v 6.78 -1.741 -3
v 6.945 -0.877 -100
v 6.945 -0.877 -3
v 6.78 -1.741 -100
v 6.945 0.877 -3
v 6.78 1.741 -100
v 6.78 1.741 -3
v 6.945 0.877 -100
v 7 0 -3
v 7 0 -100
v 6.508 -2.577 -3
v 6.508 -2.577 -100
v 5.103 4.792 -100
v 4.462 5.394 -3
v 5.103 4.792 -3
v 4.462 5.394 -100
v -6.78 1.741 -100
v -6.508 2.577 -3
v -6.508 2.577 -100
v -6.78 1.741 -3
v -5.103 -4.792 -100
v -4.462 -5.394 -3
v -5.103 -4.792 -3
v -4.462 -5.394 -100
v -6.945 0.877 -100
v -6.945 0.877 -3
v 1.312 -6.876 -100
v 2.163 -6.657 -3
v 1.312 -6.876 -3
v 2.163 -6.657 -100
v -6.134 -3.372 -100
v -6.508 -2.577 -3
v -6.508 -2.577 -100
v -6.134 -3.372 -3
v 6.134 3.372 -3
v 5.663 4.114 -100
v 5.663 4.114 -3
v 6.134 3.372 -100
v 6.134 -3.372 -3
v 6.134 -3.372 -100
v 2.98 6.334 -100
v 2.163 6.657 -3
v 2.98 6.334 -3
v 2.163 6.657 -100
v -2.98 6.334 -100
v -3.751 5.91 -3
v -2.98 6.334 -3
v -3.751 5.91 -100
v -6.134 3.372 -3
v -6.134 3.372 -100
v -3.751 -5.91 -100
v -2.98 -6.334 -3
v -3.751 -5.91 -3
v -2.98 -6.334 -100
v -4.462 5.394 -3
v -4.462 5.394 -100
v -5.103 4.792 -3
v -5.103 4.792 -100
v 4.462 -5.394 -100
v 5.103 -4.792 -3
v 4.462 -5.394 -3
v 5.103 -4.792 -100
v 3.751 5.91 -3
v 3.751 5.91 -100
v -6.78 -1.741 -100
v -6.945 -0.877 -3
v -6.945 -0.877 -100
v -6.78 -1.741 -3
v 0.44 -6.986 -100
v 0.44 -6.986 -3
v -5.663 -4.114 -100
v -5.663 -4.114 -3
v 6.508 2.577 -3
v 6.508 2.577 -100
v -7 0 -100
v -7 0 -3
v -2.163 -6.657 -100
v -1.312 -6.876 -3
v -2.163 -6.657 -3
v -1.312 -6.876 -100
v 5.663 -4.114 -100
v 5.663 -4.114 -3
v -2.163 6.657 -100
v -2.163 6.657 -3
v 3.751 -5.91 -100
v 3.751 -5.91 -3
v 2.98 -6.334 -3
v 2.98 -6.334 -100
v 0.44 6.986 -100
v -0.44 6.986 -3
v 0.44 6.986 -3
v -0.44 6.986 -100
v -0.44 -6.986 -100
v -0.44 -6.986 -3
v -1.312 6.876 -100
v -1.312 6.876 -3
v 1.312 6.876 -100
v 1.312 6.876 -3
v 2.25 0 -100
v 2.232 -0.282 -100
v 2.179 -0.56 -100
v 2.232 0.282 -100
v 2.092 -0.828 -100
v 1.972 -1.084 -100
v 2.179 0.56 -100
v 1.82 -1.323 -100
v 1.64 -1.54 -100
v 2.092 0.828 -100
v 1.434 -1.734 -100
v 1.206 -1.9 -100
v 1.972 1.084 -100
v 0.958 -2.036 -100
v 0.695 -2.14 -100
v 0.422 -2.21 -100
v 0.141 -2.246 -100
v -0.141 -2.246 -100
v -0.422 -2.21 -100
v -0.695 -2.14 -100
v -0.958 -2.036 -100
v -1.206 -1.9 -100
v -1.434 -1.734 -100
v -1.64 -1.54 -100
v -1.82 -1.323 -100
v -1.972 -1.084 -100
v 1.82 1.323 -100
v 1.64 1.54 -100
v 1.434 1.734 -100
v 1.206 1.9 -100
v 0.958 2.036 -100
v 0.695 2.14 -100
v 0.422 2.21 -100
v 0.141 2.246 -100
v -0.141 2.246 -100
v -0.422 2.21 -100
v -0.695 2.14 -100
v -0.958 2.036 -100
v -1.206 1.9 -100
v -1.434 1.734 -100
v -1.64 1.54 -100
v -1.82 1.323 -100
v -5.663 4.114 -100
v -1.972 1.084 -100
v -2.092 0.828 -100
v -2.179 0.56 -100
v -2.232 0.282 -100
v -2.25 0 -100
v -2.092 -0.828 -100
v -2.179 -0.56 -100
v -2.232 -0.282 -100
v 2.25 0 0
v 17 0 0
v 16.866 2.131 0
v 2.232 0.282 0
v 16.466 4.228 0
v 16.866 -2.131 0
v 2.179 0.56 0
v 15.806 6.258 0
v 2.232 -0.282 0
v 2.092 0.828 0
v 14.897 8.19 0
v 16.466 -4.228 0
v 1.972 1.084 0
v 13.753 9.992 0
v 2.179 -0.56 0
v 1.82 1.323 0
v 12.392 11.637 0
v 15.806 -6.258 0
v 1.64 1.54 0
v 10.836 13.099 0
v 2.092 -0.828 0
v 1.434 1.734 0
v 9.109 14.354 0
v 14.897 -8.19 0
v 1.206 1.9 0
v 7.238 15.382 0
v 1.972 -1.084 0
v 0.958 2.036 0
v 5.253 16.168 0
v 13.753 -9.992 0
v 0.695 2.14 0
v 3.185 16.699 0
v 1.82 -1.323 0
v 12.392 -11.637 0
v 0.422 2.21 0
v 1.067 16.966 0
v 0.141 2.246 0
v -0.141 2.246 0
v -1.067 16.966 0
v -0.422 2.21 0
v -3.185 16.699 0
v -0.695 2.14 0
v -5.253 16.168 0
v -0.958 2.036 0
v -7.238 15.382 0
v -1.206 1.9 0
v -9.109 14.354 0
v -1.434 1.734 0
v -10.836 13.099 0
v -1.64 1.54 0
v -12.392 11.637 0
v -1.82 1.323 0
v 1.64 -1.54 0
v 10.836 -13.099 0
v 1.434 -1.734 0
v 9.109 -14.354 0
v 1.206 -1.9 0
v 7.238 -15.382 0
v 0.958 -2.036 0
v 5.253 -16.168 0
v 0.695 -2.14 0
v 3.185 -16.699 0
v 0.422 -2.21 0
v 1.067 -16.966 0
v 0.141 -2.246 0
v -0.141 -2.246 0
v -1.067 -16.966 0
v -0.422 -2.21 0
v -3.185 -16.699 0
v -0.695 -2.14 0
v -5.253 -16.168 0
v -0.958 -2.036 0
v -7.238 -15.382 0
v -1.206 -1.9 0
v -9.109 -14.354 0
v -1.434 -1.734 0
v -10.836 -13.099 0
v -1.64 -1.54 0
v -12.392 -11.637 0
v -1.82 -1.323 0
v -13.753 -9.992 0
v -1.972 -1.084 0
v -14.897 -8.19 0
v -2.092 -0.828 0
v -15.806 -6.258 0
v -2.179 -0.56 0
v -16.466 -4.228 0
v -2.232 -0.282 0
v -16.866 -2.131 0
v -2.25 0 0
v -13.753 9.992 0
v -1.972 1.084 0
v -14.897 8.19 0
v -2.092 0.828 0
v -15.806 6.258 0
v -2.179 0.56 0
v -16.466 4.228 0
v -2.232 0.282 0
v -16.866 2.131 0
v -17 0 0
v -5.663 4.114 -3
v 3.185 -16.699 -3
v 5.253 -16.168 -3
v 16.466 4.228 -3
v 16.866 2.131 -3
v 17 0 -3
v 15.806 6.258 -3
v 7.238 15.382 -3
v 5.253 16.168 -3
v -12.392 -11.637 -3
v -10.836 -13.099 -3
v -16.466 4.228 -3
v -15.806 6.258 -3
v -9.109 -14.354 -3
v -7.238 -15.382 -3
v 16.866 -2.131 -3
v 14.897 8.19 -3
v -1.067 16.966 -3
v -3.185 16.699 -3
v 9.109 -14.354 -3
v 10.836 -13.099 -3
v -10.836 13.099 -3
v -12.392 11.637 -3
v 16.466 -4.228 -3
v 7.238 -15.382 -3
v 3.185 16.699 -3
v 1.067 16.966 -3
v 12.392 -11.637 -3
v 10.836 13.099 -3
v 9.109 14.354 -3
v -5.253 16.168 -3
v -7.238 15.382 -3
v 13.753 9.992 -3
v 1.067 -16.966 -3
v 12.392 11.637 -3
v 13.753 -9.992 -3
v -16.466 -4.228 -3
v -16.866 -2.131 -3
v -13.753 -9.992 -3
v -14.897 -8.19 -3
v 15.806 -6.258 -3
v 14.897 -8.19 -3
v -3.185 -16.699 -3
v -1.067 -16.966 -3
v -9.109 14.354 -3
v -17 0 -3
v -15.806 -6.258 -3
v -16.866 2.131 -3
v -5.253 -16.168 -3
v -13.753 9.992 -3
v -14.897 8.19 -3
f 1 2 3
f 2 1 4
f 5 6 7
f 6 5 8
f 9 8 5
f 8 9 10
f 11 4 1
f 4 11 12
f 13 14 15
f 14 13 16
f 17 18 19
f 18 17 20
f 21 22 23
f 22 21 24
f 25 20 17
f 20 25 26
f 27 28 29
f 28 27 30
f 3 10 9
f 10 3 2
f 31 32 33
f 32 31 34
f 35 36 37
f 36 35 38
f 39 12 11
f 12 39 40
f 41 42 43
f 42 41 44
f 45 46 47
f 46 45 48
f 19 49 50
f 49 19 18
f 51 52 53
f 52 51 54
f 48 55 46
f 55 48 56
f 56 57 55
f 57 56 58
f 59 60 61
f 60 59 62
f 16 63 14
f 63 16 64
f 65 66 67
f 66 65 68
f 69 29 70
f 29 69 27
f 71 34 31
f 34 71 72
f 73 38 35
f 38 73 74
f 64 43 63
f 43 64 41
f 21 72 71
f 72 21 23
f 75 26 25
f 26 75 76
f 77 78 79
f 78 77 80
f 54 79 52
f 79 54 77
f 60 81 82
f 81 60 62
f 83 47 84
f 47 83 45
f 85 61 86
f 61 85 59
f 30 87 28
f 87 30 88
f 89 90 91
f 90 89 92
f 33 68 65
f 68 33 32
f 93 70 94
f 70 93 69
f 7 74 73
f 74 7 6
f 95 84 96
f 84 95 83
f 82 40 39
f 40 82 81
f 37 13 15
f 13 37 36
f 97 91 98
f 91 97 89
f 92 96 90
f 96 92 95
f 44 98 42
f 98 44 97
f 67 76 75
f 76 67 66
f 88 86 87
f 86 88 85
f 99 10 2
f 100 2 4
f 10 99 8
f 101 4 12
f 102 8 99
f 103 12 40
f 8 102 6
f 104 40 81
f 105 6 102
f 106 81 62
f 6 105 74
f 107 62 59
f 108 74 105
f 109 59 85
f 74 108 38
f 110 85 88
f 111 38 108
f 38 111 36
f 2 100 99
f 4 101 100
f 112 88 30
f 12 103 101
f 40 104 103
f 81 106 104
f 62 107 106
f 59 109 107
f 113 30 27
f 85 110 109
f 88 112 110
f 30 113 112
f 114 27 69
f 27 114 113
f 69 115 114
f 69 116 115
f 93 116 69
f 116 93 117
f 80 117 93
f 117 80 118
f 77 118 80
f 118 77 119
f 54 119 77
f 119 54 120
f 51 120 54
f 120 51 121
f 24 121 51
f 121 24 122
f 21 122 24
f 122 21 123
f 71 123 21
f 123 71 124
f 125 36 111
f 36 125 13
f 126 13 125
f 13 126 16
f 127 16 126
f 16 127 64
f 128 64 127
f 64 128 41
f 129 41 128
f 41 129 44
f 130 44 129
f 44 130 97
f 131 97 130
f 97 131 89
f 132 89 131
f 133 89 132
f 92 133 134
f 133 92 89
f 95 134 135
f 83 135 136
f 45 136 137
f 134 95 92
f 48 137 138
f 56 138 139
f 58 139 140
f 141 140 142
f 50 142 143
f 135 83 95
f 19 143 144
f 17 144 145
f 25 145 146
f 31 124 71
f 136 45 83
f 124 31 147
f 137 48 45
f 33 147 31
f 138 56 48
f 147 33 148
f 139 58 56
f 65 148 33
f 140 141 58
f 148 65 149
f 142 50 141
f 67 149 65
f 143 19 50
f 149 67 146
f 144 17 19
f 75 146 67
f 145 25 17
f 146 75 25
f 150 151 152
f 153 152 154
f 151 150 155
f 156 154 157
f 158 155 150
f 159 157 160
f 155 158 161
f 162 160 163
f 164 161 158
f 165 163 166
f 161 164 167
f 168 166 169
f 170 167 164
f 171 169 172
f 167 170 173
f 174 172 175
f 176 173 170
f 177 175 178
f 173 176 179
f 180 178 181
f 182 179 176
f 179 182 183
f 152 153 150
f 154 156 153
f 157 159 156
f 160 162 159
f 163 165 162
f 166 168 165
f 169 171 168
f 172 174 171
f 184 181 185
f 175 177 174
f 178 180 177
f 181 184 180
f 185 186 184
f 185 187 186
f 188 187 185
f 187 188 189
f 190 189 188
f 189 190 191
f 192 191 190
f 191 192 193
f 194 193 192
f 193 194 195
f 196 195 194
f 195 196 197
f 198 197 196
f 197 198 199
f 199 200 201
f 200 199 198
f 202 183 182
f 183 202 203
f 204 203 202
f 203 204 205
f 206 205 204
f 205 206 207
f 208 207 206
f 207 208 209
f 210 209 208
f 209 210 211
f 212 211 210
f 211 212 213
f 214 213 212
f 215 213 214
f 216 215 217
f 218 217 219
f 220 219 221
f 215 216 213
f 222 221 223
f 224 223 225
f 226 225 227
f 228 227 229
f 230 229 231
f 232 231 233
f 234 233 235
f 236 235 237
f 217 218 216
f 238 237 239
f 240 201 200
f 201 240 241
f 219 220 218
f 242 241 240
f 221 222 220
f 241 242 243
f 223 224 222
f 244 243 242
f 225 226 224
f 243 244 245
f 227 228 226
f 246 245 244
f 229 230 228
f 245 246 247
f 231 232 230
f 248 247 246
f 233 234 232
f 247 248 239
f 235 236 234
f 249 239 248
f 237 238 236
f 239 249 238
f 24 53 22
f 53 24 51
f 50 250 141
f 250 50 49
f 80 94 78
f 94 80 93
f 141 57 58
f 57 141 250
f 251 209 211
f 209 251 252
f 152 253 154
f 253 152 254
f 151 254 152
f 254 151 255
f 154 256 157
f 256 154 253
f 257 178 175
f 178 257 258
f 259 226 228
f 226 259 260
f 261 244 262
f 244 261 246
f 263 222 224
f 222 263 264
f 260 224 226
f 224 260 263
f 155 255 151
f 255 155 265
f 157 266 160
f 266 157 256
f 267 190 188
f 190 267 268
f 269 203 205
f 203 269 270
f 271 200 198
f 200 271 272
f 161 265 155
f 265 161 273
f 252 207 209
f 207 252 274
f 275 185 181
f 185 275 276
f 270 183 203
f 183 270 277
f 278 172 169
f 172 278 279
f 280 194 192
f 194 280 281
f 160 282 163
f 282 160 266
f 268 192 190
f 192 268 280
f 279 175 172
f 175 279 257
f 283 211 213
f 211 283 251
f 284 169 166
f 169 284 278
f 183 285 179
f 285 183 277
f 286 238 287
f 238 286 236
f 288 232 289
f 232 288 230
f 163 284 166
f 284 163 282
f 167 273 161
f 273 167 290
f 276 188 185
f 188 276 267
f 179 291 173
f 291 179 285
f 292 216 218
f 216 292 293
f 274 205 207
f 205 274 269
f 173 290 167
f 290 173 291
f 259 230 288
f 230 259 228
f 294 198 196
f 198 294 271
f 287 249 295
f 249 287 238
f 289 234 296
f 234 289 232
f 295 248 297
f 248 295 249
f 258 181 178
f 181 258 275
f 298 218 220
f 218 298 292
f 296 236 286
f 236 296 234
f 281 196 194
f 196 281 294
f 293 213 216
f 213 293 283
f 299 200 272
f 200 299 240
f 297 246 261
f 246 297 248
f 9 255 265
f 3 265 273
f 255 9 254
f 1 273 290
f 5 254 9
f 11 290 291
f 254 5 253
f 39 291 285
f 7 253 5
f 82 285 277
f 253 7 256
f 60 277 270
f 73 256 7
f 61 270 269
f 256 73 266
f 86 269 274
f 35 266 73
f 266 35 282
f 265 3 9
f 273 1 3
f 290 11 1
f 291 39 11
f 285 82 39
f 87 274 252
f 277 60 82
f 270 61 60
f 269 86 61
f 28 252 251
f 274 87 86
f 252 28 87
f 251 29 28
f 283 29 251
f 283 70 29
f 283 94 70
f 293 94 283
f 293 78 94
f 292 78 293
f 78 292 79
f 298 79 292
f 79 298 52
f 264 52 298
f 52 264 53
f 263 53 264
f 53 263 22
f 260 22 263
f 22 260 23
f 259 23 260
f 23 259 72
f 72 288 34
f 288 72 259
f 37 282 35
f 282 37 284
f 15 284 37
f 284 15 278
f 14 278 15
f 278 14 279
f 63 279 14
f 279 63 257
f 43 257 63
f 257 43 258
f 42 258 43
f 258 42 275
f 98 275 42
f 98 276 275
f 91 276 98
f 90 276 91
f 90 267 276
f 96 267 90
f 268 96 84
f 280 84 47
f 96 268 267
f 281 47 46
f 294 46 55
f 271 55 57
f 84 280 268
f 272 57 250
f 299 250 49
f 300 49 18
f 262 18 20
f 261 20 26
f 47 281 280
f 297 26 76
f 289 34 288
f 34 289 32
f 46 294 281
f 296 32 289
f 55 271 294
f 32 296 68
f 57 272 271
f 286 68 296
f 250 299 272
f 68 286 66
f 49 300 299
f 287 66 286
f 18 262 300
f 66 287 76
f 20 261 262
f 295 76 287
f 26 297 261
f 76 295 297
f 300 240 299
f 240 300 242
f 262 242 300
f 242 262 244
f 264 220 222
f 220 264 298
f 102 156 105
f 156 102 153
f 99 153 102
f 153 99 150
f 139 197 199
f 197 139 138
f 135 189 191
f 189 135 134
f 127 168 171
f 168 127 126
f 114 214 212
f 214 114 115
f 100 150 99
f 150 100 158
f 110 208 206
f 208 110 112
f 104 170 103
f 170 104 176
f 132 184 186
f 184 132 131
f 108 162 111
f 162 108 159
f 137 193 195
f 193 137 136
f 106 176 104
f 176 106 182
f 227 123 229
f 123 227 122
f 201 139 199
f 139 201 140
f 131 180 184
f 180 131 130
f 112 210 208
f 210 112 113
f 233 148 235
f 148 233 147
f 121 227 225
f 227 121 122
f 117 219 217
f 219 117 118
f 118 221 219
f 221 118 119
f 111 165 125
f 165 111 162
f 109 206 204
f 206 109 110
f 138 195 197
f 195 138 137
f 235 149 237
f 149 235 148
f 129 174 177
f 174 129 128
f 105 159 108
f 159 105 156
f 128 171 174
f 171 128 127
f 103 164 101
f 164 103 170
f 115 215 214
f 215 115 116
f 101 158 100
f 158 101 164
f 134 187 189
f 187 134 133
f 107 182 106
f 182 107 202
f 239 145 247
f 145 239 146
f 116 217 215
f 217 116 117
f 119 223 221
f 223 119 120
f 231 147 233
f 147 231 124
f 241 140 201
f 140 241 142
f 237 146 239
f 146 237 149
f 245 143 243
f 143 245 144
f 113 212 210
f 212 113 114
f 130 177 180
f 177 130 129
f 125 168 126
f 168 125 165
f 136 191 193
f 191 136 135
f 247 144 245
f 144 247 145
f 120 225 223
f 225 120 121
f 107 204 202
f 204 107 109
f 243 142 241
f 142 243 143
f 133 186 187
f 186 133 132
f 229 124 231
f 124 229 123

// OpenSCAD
$fn = 50;


difference() {
	union() {
		translate(v = [0, 0, -100.0000000000]) {
			cylinder(h = 100, r = 7.0000000000);
		}
		translate(v = [0, 0, -3.0000000000]) {
			cylinder(h = 3, r = 17.0000000000);
		}
	}
	union() {
		#translate(v = [0, 0, -100]) {
			cylinder(h = 100, r = 2.2500000000);
		}
	}
}
